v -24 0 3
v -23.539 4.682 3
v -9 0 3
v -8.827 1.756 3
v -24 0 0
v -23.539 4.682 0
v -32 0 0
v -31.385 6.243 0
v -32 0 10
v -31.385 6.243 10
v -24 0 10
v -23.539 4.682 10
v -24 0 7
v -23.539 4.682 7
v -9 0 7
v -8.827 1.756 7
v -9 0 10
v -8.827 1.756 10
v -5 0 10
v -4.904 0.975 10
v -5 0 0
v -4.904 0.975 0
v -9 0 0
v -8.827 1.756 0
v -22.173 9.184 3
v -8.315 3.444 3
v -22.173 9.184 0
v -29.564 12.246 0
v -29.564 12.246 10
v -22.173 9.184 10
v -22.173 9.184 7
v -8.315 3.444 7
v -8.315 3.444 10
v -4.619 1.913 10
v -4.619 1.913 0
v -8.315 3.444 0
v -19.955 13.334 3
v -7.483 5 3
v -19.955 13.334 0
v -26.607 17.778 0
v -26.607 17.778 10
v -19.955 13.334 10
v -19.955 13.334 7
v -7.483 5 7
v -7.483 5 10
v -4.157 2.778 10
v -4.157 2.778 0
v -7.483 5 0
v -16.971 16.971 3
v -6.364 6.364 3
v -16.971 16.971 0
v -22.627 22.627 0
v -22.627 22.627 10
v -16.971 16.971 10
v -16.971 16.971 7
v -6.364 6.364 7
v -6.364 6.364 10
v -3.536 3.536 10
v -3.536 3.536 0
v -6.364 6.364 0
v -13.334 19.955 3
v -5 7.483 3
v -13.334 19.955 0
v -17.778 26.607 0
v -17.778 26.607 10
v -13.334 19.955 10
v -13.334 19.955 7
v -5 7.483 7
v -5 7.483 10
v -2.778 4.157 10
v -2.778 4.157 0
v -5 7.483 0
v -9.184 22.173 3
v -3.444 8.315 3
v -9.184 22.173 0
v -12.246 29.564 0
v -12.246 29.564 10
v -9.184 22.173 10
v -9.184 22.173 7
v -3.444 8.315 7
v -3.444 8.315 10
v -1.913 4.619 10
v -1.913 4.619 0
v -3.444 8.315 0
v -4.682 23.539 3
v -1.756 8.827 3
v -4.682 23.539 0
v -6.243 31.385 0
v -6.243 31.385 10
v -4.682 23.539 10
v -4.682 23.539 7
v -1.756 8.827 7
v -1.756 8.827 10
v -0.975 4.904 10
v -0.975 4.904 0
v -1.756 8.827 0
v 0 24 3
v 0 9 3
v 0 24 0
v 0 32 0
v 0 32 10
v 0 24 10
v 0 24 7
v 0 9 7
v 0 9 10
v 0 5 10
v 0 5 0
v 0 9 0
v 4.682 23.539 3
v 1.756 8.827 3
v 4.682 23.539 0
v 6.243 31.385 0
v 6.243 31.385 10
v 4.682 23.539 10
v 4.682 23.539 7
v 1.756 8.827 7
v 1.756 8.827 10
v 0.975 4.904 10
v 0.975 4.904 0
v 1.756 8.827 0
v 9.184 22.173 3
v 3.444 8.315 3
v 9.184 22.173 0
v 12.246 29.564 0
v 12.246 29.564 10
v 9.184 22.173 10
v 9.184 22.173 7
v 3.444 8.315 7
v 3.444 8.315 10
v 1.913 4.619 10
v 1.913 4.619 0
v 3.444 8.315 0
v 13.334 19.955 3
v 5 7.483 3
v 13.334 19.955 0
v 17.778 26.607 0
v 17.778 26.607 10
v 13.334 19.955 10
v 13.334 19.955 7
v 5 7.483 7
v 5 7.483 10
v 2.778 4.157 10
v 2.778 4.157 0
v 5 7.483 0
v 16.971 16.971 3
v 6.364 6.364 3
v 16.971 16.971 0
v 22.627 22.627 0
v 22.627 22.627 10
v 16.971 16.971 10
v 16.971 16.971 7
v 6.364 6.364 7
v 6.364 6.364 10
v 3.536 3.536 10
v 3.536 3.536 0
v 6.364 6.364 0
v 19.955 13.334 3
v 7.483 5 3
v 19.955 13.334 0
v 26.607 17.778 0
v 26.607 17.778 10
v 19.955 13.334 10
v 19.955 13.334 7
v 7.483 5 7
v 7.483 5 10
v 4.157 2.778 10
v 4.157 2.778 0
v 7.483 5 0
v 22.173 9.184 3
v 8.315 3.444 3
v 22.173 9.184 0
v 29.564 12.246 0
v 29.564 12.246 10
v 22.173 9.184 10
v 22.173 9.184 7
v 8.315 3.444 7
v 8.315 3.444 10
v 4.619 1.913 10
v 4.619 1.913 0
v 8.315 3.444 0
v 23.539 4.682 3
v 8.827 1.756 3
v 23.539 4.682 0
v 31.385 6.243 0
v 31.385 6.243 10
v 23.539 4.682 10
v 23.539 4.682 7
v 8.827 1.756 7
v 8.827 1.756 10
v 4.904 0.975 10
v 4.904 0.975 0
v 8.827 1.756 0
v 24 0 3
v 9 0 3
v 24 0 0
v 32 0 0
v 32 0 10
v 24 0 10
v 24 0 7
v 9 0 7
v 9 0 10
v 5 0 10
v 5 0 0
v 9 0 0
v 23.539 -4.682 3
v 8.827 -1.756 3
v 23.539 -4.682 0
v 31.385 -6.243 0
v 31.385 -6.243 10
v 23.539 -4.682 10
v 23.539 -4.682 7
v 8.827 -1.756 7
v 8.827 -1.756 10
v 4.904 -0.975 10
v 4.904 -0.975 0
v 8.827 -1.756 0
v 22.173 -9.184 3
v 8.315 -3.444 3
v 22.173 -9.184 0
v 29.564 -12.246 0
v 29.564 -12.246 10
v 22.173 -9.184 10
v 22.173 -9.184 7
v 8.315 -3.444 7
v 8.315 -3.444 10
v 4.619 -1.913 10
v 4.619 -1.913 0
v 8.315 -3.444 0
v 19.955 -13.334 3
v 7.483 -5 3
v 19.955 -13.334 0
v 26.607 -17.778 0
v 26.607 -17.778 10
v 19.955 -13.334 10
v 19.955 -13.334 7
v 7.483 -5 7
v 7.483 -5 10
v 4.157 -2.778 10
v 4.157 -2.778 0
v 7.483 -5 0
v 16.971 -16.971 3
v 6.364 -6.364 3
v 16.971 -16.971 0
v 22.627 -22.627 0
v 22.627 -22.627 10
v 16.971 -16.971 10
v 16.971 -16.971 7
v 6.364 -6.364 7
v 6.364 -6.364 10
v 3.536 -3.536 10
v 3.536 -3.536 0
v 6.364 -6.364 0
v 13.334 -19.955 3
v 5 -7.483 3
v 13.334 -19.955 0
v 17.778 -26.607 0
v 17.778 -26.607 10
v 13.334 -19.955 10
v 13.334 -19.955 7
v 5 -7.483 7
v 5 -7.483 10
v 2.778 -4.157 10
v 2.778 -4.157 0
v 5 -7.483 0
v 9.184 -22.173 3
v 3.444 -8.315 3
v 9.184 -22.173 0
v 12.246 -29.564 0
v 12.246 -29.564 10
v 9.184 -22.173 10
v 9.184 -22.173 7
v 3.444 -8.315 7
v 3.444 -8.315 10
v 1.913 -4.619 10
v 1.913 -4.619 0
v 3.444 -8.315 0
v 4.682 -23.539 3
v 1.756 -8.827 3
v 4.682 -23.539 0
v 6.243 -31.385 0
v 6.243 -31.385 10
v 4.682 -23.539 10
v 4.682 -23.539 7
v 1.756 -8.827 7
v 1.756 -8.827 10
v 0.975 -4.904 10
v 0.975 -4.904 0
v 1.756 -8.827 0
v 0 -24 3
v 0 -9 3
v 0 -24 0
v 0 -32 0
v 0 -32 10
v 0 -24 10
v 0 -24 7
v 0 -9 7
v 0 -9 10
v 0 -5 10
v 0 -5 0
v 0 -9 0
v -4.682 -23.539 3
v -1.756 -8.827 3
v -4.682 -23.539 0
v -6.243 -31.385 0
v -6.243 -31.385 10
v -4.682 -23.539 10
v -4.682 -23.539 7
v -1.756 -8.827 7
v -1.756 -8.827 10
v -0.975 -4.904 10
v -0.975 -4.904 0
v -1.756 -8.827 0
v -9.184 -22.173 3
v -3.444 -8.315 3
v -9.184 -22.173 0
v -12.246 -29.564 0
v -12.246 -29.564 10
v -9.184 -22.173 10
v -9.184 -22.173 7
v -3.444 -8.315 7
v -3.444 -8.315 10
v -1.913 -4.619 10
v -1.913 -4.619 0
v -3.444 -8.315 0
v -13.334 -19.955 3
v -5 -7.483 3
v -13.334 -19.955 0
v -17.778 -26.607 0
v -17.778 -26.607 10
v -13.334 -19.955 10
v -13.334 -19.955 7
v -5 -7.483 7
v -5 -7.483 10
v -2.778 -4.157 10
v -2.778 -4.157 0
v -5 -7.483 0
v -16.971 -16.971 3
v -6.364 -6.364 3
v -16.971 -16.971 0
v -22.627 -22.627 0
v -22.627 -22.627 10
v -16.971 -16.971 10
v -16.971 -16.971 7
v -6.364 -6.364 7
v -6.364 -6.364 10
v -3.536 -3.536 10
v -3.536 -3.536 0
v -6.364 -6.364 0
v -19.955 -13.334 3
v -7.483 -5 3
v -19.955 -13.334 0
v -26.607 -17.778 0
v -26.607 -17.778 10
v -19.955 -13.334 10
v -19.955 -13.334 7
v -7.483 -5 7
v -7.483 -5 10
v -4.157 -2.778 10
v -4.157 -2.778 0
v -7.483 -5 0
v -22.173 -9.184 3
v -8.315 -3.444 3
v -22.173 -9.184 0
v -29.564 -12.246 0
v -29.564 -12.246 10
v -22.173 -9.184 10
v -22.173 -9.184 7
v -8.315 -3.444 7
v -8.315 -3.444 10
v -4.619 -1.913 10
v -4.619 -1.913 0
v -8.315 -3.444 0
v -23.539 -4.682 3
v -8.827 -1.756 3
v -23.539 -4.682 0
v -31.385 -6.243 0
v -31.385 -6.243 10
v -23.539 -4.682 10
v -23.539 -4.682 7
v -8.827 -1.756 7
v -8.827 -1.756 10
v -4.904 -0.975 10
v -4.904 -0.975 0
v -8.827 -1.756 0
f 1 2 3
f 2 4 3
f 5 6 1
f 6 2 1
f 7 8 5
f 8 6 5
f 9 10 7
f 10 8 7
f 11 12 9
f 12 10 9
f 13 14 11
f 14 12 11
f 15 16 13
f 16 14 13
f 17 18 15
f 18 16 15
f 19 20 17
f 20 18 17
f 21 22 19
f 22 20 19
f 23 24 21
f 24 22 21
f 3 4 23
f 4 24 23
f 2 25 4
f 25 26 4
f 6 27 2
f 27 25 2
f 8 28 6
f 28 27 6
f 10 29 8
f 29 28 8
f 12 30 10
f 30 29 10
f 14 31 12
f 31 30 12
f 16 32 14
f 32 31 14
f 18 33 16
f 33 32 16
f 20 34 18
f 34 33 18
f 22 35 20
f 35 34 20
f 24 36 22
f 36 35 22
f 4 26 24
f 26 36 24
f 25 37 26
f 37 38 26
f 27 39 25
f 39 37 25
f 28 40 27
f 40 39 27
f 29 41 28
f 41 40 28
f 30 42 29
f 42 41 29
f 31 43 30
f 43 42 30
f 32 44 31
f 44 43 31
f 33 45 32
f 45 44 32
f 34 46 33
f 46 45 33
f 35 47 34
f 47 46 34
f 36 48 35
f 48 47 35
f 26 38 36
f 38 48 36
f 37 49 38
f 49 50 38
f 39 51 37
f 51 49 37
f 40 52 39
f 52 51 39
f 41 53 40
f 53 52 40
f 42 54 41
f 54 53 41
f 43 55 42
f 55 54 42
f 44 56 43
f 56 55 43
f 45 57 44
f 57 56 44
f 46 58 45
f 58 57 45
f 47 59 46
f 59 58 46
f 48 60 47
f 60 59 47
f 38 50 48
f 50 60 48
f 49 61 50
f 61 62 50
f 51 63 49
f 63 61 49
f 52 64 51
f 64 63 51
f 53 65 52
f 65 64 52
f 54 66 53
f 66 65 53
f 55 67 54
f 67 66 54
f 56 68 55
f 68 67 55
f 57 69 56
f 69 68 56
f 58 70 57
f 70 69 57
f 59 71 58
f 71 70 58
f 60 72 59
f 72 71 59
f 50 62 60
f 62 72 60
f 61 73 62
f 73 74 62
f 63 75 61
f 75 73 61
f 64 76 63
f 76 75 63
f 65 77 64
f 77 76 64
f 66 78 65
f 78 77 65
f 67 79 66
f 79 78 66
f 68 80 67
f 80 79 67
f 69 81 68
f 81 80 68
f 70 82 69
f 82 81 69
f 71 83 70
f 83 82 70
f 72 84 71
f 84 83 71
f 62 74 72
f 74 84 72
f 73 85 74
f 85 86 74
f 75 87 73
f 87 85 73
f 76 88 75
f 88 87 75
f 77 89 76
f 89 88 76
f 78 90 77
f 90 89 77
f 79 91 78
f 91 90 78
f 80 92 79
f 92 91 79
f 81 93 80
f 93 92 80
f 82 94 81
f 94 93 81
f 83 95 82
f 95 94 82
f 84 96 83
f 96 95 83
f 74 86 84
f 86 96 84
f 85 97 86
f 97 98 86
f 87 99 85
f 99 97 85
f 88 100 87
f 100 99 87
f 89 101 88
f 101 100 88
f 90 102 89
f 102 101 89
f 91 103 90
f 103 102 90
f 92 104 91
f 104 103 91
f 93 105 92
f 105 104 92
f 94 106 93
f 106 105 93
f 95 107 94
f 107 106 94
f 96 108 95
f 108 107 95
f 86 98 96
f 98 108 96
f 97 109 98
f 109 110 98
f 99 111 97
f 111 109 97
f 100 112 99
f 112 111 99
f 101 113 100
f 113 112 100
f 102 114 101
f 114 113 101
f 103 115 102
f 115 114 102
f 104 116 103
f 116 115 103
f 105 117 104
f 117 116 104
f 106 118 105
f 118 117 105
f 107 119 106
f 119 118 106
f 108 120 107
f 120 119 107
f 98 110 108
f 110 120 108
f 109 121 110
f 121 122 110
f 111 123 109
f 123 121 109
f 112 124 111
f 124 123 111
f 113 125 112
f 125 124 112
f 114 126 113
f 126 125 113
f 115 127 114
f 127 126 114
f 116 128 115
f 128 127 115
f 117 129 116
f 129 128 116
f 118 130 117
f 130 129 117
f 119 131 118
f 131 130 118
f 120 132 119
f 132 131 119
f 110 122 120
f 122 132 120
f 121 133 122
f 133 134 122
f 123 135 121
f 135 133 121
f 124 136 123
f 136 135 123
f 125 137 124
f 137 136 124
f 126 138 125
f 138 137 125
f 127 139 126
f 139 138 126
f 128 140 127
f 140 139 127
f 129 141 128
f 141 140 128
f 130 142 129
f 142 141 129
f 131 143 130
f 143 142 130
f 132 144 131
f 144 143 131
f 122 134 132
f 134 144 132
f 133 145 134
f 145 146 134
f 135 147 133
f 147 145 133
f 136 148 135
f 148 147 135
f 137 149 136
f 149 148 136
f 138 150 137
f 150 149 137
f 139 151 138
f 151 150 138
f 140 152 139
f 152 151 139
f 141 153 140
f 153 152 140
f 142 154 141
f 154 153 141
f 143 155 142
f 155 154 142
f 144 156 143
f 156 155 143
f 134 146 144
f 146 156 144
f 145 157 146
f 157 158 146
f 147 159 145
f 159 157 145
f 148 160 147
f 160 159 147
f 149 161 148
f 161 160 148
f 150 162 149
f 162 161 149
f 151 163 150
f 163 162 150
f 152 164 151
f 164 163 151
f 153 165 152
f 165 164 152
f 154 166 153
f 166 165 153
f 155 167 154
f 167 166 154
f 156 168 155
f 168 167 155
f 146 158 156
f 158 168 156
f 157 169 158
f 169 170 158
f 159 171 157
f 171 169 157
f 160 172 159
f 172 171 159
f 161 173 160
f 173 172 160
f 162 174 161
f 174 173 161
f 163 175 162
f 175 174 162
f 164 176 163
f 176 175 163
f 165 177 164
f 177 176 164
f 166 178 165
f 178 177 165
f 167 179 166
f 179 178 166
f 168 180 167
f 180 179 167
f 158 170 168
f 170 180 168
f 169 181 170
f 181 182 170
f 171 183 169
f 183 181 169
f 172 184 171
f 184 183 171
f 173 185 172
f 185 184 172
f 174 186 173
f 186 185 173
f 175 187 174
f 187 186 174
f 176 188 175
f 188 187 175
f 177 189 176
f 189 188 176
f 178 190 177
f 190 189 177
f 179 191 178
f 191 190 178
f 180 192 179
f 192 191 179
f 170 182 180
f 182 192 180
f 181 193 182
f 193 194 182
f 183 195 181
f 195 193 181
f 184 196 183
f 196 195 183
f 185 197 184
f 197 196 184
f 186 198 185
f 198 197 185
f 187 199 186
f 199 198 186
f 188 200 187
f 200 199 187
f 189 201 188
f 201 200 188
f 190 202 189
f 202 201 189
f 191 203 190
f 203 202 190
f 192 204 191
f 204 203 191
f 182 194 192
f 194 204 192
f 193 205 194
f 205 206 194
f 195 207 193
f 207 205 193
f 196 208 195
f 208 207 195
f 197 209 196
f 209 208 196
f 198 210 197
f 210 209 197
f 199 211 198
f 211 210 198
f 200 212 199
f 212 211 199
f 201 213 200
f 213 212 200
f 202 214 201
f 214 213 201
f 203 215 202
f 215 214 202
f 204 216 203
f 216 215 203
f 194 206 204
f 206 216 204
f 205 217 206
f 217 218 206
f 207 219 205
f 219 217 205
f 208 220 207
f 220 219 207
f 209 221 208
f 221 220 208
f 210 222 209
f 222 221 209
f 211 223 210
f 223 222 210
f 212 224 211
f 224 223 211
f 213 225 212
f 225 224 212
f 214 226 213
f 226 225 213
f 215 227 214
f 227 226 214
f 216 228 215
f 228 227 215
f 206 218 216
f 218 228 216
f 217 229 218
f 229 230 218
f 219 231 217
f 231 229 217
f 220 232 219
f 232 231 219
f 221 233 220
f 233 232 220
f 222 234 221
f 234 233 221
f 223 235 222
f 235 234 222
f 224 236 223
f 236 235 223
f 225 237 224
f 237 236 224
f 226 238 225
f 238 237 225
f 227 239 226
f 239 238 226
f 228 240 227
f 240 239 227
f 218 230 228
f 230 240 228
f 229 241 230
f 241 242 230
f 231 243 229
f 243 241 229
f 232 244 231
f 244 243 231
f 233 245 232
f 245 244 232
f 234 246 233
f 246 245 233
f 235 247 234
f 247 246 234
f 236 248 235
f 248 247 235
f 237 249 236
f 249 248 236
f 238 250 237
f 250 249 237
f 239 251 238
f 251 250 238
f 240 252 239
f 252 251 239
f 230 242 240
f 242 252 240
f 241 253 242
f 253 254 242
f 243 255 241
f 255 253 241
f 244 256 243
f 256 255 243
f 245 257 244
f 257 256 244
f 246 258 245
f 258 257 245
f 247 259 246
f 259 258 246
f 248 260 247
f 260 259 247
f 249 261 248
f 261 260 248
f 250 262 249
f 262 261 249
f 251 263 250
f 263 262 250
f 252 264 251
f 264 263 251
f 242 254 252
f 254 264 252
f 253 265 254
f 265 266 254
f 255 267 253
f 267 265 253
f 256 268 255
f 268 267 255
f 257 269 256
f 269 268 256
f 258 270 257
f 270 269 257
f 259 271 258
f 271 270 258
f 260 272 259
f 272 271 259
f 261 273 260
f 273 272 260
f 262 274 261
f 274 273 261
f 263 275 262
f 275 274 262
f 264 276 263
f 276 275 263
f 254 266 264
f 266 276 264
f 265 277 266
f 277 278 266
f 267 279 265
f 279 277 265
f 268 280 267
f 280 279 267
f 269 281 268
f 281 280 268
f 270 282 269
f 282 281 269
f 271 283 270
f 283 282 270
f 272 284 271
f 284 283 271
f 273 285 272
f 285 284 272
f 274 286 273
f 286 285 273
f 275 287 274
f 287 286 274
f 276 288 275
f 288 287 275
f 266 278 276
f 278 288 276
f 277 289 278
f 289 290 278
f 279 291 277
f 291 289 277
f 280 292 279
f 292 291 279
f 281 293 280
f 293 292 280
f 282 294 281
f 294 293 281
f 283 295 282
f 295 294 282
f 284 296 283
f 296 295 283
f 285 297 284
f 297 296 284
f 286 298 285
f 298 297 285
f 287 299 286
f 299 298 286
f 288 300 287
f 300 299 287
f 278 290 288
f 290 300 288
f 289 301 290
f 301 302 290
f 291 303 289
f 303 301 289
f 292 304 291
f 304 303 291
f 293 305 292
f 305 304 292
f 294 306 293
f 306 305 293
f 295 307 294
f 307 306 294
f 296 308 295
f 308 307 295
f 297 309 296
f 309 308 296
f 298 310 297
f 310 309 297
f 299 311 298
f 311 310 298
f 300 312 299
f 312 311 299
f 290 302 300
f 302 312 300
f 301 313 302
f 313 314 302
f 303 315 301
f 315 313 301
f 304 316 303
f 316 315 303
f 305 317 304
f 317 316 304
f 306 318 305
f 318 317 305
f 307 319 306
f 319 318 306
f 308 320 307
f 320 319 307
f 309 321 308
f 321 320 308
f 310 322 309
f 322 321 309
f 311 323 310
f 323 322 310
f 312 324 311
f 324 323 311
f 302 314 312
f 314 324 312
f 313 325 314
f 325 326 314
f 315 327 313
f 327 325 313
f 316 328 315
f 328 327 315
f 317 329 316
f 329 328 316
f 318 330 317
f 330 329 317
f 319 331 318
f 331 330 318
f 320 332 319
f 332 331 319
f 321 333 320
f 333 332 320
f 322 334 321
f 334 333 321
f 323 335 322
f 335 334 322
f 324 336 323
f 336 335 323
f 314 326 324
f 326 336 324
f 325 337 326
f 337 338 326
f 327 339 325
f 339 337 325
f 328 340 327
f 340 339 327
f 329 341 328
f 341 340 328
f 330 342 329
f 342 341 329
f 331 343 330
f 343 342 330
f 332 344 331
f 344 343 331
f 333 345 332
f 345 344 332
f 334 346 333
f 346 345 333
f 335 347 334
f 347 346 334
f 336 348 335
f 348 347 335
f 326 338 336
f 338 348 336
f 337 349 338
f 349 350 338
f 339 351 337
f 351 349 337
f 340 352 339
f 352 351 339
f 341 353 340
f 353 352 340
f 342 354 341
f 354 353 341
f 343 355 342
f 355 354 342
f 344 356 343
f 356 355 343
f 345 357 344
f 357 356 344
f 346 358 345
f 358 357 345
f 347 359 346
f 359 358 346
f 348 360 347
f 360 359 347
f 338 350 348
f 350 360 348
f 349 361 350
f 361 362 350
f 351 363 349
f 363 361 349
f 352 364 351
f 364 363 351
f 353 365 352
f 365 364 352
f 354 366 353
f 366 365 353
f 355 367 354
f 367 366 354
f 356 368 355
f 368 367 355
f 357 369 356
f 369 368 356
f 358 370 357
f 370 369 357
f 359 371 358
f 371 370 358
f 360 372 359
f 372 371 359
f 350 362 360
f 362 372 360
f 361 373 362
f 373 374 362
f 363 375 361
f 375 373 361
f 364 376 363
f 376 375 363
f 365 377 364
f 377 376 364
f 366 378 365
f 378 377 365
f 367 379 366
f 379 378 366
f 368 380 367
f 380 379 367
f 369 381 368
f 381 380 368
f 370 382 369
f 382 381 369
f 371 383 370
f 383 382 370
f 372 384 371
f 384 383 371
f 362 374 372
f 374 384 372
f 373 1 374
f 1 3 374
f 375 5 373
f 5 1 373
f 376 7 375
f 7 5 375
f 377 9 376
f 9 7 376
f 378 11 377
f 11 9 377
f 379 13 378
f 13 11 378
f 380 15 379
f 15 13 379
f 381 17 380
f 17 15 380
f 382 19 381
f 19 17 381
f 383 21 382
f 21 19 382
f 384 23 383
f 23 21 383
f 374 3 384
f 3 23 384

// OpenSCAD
$fn = 32;

// ----------------------------------------------------------------------
// Revolved part: handwheel R32
// ----------------------------------------------------------------------

// --- parameters (mm) ---
bore_r = 5;               // bore radius
rim_r = 32;               // rim radius
rim_w = 8;                // rim axial width
rim_t = 10;               // rim diameter height
hub_r = 9;                // hub radius
web_t = 4;                // web thickness
revolve_angle = 360;      // revolve sweep, degrees

bore_d = 2 * bore_r;
rim_d = 2 * rim_r;
hub_d = 2 * hub_r;

profile = [[5, 0], [9, 0], [9, 3], [24, 3], [24, 0], [32, 0], [32, 10], [24, 10], [24, 7], [9, 7], [9, 10], [5, 10]];  // primary outline, 12 points, counter clockwise

// --- the one profile operation ---
rotate_extrude(angle = revolve_angle) polygon(points = profile);
